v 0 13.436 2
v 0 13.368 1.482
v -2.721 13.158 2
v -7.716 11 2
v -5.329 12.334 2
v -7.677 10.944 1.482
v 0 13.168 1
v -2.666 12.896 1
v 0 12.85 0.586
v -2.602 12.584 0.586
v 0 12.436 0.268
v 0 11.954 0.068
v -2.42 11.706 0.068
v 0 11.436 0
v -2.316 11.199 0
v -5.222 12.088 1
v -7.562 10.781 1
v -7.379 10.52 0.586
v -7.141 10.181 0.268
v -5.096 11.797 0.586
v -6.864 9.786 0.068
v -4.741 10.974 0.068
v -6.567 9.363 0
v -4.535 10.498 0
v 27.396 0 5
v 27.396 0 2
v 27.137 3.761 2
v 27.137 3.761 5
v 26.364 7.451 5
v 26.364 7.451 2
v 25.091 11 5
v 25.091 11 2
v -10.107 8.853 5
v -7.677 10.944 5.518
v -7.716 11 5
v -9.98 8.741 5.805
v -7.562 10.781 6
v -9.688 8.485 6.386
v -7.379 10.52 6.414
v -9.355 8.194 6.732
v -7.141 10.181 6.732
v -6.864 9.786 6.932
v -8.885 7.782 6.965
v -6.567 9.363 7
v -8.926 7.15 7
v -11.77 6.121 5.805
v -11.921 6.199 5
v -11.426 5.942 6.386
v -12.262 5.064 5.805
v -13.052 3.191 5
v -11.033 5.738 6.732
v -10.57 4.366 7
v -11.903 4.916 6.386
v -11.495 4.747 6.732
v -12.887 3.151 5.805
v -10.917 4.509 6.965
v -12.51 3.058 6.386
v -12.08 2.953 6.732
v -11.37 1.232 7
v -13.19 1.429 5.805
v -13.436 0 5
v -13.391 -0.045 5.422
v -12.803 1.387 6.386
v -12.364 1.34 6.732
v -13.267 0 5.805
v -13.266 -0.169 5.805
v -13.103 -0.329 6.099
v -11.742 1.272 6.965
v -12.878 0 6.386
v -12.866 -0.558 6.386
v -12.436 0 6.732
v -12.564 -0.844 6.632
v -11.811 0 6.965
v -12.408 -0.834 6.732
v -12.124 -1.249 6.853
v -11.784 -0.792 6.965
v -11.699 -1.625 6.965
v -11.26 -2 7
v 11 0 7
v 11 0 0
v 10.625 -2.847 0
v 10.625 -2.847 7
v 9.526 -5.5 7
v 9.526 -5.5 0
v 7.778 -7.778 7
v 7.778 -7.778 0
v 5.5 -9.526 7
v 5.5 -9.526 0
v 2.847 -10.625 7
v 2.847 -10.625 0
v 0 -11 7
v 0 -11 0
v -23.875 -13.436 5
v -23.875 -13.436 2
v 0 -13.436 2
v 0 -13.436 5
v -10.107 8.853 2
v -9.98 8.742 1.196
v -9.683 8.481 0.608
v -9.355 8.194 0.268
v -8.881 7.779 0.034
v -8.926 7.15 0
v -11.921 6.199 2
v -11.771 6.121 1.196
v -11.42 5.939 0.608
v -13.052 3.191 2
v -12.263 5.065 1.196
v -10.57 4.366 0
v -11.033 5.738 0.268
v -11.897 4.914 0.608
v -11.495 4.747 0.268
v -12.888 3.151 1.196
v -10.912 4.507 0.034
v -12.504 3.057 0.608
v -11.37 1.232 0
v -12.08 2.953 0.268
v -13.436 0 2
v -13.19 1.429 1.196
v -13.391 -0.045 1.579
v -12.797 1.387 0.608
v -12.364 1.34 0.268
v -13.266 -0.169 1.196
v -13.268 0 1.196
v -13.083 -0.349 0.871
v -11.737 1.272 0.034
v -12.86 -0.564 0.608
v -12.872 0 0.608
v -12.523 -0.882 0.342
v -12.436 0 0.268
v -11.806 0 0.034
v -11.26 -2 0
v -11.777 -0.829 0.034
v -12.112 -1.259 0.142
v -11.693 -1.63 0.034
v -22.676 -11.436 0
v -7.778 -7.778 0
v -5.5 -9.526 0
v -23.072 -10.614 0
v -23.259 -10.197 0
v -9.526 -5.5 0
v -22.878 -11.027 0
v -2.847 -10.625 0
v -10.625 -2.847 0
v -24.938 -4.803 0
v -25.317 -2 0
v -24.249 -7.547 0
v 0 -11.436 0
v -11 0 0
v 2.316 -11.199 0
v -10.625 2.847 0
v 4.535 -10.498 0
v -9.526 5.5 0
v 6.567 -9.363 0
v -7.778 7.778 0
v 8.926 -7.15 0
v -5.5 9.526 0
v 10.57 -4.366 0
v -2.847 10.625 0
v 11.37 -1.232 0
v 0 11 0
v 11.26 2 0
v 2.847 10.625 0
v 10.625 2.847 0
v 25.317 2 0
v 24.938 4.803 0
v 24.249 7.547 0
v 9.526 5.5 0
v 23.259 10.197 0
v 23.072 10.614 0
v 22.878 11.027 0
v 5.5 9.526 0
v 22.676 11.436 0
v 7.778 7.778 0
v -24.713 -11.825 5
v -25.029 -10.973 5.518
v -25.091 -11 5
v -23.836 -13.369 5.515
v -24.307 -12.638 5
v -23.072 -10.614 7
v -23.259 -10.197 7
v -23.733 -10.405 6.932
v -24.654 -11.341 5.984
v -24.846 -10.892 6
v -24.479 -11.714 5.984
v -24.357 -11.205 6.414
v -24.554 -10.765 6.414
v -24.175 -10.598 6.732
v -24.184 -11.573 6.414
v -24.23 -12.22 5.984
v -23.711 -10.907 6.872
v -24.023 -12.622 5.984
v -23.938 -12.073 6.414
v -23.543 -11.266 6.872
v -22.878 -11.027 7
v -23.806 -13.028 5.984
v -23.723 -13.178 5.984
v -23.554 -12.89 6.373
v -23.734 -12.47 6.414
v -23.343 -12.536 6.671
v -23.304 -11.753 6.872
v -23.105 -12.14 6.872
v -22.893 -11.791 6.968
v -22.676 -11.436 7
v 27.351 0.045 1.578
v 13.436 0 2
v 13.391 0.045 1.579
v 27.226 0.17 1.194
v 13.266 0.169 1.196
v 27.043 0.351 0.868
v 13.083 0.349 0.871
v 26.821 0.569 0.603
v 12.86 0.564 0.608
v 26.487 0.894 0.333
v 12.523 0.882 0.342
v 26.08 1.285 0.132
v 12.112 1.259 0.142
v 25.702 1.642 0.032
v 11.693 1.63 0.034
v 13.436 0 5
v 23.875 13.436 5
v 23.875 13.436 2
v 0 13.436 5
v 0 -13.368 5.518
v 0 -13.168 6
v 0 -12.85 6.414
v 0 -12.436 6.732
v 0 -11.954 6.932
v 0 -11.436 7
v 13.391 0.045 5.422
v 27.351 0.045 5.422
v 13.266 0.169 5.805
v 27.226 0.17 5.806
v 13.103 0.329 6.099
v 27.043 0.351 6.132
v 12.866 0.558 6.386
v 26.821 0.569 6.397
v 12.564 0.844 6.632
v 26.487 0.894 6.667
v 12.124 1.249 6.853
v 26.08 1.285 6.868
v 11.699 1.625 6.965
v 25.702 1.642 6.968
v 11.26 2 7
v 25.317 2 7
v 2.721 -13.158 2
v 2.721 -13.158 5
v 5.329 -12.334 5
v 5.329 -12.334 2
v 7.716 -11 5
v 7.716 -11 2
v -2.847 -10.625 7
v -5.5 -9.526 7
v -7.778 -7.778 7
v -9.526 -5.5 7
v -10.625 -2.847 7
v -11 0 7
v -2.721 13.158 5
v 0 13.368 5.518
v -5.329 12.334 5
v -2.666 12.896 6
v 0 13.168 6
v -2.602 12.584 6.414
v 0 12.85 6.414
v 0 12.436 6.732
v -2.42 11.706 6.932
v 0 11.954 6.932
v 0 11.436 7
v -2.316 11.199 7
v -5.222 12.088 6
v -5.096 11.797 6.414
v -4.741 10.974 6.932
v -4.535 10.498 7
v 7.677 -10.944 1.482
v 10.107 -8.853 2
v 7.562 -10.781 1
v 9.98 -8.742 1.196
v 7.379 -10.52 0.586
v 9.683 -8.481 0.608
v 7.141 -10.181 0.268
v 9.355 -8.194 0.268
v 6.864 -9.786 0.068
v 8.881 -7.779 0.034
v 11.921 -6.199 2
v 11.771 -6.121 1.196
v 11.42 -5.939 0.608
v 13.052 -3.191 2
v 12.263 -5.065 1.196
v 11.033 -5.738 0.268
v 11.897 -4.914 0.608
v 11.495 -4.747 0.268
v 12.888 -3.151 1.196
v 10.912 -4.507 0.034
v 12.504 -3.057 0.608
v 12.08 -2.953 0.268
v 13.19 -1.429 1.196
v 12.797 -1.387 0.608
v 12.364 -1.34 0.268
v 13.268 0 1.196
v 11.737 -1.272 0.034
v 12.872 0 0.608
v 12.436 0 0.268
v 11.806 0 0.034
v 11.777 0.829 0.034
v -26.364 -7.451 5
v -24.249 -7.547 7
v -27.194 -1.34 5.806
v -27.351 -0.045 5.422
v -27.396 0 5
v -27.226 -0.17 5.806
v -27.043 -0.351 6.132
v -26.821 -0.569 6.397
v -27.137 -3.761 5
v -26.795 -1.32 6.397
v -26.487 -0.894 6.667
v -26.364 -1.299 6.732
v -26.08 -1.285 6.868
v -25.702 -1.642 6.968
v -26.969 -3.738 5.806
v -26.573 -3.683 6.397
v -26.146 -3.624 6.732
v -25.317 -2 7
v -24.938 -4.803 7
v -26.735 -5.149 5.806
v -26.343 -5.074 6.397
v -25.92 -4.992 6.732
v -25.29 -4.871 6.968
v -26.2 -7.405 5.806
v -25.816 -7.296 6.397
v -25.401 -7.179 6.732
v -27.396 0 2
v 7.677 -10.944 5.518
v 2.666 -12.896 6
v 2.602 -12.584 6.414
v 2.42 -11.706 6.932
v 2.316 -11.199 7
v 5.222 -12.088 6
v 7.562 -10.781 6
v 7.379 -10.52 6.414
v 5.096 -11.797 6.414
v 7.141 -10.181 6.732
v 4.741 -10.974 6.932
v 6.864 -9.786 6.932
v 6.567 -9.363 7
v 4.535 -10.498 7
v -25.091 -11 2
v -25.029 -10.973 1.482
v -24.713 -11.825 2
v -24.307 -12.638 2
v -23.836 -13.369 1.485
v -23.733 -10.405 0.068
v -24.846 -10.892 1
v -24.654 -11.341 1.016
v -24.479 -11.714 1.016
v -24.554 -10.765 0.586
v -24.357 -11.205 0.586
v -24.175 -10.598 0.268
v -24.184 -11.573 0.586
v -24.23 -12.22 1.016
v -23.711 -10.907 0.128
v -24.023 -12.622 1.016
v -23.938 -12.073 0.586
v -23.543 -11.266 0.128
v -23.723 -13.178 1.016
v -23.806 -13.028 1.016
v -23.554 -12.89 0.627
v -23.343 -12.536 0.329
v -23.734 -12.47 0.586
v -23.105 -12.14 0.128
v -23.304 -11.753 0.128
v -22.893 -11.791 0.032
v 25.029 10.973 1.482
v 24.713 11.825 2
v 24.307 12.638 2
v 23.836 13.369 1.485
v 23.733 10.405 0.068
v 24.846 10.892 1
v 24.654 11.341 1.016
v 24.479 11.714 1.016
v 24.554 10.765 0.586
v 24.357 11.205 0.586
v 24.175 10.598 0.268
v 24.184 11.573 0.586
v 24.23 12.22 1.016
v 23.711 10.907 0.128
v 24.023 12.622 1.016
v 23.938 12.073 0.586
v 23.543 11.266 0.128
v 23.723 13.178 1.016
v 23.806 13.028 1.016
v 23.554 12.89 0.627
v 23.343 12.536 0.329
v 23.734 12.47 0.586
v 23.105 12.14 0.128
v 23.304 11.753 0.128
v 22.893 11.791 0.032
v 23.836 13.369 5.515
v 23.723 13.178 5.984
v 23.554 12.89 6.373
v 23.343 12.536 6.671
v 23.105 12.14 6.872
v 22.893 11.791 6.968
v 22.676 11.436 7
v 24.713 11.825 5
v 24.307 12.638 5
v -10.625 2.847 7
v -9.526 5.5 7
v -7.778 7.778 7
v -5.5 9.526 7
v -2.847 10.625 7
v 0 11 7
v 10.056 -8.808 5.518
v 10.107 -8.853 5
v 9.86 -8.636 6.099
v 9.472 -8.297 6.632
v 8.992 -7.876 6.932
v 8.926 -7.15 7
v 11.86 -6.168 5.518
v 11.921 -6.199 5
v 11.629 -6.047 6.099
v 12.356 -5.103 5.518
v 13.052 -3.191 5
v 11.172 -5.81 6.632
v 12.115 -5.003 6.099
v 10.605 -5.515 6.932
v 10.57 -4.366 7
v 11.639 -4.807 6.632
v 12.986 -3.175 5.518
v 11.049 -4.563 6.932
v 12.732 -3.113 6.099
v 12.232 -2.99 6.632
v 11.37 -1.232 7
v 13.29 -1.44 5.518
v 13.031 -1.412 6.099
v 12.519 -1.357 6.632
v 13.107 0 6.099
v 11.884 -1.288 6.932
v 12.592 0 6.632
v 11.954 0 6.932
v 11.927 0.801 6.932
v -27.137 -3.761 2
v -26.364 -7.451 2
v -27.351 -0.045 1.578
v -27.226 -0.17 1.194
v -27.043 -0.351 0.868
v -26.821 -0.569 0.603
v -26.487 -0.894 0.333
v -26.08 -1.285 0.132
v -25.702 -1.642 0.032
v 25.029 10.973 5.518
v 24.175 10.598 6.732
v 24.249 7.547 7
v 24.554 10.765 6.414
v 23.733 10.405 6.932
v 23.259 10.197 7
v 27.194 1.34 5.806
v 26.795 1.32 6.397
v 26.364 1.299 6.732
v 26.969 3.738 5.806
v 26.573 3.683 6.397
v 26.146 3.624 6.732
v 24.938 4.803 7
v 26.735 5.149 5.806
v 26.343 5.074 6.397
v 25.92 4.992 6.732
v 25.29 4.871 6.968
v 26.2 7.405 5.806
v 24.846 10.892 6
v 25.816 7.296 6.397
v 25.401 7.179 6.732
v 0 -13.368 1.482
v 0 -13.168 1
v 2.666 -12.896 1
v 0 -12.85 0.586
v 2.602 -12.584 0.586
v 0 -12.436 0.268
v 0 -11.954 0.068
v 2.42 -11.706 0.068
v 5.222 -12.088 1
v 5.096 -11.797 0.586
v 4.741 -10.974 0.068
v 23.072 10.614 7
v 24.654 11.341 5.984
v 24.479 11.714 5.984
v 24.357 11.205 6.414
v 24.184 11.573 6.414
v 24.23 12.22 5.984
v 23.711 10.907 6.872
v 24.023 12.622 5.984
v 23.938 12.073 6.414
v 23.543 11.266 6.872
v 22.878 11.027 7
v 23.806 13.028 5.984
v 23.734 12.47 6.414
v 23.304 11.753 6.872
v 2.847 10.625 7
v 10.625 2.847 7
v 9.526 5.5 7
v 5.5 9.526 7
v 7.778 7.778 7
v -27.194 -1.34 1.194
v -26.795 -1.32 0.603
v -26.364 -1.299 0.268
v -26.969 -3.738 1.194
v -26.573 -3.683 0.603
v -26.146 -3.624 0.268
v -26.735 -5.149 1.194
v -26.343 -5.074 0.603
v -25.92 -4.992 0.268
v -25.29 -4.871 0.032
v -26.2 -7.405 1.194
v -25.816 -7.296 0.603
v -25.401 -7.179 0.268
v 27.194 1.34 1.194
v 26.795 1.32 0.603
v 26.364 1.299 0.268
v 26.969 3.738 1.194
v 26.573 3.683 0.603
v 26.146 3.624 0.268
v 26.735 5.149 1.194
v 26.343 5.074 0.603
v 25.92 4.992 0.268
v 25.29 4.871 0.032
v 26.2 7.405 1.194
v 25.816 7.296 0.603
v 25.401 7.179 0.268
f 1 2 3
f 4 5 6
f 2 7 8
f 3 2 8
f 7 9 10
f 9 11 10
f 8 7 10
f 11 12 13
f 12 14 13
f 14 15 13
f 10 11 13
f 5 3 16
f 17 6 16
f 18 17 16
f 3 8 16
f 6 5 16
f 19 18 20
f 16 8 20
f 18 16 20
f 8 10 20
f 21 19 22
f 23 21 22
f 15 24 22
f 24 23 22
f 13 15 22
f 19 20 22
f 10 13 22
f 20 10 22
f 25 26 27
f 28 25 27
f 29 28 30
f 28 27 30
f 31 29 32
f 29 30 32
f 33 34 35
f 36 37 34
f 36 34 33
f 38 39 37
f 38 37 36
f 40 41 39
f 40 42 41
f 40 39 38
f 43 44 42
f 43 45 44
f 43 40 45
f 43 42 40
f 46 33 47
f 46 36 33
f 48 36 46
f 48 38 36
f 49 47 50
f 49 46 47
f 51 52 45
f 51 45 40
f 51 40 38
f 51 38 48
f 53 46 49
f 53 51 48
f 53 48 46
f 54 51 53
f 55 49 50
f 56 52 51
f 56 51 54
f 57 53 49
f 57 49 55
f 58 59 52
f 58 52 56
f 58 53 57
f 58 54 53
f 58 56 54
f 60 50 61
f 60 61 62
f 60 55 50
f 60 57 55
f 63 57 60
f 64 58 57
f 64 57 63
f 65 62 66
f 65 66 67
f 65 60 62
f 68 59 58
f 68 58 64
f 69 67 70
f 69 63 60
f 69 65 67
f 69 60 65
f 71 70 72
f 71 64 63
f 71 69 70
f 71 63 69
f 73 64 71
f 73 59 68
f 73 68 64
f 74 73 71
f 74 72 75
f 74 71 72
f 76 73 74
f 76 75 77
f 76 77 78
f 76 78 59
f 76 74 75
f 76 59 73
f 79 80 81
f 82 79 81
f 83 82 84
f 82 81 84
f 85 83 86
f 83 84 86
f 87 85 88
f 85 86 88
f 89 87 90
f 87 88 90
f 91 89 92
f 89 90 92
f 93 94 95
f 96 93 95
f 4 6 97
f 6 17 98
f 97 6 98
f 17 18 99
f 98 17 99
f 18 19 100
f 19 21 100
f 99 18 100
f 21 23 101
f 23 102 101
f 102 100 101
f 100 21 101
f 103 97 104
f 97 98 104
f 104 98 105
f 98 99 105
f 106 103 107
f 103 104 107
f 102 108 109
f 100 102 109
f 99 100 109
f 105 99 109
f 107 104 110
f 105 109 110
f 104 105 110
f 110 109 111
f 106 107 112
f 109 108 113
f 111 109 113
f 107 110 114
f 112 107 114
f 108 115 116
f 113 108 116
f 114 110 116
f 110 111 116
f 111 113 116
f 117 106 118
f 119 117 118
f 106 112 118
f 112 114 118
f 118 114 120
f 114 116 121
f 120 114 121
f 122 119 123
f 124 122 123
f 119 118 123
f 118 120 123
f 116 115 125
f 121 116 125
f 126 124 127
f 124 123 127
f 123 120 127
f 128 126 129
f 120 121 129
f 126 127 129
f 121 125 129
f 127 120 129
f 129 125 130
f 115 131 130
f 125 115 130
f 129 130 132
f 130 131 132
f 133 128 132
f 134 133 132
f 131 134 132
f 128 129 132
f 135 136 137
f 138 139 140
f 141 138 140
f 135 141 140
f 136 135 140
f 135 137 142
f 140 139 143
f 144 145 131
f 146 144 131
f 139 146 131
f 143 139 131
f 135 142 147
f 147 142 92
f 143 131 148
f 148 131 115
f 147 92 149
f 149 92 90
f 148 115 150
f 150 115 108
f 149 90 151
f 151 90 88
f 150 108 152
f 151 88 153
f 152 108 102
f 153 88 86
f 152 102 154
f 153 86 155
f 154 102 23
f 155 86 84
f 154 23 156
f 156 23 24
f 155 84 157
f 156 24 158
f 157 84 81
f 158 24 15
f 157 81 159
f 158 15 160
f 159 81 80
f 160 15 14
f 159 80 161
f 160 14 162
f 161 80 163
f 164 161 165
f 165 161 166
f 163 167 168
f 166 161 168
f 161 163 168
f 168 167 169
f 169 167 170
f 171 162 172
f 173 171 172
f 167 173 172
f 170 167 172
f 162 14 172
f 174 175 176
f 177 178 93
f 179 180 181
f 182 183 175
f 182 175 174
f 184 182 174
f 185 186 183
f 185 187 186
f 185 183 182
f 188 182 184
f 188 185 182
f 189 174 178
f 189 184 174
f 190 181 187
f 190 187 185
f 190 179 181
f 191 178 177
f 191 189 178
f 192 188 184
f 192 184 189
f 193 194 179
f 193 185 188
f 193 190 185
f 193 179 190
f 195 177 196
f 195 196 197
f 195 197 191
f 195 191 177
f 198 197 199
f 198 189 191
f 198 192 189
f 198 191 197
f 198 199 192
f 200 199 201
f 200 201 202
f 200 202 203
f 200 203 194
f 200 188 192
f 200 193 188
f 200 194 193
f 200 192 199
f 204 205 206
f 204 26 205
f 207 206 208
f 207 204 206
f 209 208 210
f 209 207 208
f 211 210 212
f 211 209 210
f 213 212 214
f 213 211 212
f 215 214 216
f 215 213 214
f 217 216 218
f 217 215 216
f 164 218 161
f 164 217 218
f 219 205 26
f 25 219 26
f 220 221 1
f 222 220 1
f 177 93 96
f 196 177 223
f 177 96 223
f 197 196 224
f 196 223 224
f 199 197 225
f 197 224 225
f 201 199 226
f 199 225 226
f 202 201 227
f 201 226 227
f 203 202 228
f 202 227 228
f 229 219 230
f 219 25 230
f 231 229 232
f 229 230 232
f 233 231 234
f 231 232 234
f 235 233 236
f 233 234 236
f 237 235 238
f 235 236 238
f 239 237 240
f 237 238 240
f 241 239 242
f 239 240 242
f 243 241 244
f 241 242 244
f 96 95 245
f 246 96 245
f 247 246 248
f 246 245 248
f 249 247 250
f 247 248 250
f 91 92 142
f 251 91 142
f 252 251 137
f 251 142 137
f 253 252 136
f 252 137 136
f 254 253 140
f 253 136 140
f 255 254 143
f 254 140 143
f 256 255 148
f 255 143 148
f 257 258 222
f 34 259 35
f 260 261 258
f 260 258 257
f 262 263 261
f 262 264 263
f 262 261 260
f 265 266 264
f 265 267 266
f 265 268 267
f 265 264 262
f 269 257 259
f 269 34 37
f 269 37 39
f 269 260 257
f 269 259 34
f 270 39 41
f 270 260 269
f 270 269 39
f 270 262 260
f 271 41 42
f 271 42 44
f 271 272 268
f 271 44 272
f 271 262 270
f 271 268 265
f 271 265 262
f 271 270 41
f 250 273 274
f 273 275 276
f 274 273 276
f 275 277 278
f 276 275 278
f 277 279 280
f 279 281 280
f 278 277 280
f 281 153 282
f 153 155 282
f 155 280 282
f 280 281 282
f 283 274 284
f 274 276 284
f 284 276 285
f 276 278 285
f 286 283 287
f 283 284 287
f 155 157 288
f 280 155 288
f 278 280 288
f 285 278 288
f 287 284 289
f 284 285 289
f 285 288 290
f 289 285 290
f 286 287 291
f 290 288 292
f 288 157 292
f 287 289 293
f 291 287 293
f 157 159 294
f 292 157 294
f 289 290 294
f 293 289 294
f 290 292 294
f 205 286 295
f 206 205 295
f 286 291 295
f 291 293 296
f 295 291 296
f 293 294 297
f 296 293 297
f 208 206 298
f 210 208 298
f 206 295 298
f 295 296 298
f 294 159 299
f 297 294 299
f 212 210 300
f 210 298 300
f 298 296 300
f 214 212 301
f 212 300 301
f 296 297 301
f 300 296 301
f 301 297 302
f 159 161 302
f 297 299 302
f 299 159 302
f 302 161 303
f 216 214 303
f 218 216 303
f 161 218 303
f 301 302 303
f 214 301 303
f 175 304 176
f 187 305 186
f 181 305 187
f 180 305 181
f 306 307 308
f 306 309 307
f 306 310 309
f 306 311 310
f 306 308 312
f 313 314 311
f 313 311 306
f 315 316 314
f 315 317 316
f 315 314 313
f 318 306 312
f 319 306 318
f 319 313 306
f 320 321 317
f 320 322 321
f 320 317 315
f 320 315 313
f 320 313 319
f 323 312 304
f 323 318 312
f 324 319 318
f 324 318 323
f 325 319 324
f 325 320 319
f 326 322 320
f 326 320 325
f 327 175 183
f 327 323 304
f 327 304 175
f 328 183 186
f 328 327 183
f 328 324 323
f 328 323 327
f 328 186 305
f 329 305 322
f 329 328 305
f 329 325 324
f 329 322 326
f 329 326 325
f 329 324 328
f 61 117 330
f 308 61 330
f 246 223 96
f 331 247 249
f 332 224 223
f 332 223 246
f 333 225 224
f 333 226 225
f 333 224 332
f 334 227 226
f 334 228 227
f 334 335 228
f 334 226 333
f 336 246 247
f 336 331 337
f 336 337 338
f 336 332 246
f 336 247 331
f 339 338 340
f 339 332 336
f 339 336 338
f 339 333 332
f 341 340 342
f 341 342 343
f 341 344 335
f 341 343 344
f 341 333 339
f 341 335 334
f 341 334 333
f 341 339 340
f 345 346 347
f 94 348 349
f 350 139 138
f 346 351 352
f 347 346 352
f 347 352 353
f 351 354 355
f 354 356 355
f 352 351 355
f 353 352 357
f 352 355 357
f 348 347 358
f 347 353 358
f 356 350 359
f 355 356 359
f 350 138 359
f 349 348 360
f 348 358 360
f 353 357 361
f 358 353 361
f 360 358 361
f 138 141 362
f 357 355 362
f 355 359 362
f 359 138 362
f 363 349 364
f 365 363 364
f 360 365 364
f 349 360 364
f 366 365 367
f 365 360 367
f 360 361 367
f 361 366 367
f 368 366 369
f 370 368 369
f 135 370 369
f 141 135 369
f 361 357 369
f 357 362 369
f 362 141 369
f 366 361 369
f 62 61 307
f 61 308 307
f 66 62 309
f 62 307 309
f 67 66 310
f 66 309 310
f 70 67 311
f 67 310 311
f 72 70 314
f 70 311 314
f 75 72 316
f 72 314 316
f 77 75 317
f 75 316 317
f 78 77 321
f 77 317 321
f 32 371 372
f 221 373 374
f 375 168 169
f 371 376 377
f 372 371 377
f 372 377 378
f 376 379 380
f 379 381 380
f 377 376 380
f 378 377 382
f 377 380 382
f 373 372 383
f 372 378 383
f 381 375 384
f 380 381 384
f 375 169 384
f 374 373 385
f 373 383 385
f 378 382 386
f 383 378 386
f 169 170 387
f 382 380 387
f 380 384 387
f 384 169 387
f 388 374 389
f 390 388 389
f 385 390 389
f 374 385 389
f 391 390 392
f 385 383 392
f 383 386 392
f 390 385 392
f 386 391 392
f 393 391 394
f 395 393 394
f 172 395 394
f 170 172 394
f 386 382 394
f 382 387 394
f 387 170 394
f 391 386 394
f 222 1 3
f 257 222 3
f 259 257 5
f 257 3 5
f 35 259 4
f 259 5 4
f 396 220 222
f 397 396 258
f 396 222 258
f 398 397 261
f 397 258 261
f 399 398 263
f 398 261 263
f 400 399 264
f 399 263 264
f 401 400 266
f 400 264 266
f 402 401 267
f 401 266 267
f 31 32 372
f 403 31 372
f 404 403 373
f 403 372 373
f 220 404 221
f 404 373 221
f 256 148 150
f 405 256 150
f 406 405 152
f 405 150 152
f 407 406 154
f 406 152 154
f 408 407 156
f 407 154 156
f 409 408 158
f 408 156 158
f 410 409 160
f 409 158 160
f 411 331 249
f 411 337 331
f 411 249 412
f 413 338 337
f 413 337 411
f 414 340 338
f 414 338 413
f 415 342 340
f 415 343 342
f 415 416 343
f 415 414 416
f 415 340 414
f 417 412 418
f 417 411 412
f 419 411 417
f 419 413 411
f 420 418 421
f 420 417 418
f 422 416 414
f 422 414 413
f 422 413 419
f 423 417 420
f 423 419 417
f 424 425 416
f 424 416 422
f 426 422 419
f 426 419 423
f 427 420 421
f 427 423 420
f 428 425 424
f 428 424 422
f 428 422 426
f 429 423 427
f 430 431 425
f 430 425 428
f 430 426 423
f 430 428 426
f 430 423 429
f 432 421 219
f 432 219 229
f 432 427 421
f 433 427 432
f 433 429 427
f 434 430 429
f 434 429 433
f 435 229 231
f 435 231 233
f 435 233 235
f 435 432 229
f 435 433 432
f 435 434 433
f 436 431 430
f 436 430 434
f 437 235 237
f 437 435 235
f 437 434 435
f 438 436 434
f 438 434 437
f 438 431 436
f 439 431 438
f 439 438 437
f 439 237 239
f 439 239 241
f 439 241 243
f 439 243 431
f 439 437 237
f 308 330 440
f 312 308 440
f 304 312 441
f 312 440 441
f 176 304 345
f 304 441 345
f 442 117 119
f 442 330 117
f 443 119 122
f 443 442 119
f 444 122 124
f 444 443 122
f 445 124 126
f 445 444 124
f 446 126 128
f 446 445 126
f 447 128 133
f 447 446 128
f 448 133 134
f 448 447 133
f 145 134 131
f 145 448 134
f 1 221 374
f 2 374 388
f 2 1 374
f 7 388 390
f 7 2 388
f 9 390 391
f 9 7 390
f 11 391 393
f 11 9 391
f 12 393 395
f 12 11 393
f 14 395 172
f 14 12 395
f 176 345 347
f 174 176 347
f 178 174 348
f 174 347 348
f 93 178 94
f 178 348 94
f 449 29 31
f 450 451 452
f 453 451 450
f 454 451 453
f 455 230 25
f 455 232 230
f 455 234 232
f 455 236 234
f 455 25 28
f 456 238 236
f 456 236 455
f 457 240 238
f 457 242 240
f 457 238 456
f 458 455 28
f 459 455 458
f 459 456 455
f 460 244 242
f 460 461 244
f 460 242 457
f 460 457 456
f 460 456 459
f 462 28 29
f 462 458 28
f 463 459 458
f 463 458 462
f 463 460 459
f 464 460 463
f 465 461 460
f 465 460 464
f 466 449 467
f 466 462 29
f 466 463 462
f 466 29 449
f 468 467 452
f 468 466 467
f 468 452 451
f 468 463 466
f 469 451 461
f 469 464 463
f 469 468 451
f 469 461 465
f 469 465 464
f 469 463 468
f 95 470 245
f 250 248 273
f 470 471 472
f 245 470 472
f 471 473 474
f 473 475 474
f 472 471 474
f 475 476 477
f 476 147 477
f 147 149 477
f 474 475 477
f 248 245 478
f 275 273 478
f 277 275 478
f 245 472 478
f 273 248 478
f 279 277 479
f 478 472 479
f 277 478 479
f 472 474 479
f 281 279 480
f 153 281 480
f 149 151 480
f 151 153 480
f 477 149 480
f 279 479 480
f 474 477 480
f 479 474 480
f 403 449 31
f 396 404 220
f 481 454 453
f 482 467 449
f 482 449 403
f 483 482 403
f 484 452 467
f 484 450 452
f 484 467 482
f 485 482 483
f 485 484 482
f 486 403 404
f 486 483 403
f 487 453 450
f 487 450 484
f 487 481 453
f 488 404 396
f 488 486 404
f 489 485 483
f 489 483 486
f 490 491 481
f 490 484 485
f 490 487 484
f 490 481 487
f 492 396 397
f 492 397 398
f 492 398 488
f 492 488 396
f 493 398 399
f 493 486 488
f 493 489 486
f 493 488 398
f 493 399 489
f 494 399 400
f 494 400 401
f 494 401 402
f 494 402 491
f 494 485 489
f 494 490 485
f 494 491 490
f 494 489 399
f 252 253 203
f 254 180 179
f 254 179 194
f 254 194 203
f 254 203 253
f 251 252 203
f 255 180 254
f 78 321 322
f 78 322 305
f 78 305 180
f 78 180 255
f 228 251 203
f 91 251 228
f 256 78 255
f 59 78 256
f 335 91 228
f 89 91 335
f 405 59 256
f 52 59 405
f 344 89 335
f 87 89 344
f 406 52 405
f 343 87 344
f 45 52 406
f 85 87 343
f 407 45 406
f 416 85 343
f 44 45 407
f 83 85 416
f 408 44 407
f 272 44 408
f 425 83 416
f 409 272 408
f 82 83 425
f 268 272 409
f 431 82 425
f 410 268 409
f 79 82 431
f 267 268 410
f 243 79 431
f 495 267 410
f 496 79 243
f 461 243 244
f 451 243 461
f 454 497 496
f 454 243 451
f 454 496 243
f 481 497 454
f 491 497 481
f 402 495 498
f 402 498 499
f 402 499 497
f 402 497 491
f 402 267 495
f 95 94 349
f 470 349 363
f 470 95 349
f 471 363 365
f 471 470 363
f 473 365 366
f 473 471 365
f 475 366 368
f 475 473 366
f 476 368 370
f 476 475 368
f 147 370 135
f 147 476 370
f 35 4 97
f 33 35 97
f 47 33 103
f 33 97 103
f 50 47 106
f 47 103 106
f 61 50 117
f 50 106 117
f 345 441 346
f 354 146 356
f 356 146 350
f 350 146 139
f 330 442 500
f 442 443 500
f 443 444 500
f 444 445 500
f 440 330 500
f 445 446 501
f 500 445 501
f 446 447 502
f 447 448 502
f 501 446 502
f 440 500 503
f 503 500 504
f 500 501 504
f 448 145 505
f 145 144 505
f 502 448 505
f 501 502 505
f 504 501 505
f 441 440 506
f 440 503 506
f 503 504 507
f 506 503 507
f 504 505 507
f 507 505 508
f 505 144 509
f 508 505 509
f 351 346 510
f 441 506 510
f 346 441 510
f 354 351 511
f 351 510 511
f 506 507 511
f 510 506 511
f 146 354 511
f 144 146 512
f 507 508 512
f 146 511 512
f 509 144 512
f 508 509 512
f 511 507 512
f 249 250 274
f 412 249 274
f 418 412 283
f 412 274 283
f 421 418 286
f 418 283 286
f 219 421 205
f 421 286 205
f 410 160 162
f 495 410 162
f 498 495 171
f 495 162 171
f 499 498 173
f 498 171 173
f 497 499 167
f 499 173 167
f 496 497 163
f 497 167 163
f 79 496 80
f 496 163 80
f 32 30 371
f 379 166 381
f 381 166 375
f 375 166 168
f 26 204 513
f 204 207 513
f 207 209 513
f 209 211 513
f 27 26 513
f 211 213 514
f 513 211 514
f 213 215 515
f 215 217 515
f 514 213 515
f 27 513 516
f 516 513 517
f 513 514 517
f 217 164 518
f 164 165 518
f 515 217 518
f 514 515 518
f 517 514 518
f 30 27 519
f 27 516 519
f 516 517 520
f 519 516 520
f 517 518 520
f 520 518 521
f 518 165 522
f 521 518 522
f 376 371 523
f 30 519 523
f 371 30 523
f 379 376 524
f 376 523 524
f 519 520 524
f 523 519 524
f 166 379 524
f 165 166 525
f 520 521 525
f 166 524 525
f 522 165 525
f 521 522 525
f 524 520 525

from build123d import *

# Parameters (mm, degrees)
F1_DEPTH = 7
F2_R     = 2


with BuildPart() as f1:
    # F0 (on Top) → F1 (new body)
    with BuildSketch(Plane.XY):
        with BuildLine():
            ThreePointArc((-11, 0), (-7.7781745931, 7.7781745931), (0, 11))
            Line((0, 11), (-7.7157273072, 11))
            ThreePointArc((-7.7157273072, 11), (-11.9206288377, 6.1992786672), (-13.4362363733, 0))
            Line((-13.4362363733, 0), (-11, 0))
        make_face()
        with BuildLine():
            ThreePointArc((0, 11), (7.7781745931, 7.7781745931), (11, 0))
            Line((11, 0), (13.4362363733, 0))
            ThreePointArc((13.4362363733, 0), (11.9206288377, 6.1992786672), (7.7157273072, 11))
            Line((7.7157273072, 11), (0, 11))
        make_face()
        with BuildLine():
            Line((13.4362363733, 0), (11, 0))
            ThreePointArc((11, 0), (7.7781745931, -7.7781745931), (0, -11))
            Line((0, -11), (7.7157273072, -11))
            ThreePointArc((7.7157273072, -11), (11.9206288377, -6.1992786672), (13.4362363733, 0))
        make_face()
        with BuildLine():
            Line((7.7157273072, -11), (0, -11))
            Line((0, -11), (0, -13.4362363733))
            ThreePointArc((0, -13.4362363733), (4.0456055031, -12.8127094712), (7.7157273072, -11))
        make_face()
        with BuildLine():
            Line((0, -13.4362363733), (0, -11))
            Line((0, -11), (-7.7157273072, -11))
            ThreePointArc((-7.7157273072, -11), (-4.0456055031, -12.8127094712), (0, -13.4362363733))
        make_face()
        with BuildLine():
            Line((-7.7157273072, -11), (0, -11))
            ThreePointArc((0, -11), (-7.7781745931, -7.7781745931), (-11, 0))
            Line((-11, 0), (-13.4362363733, 0))
            ThreePointArc((-13.4362363733, 0), (-11.9206288377, -6.1992786672), (-7.7157273072, -11))
        make_face()
        with BuildLine():
            Line((-25.0909402017, -11), (-7.7157273072, -11))
            ThreePointArc((-7.7157273072, -11), (-11.9206288377, -6.1992786672), (-13.4362363733, 0))
            Line((-13.4362363733, 0), (-27.3962639826, 0))
            ThreePointArc((-27.3962639826, 0), (-26.8137399624, -5.619486581), (-25.0909402017, -11))
        make_face()
        with BuildLine():
            ThreePointArc((7.7157273072, 11), (11.9206288377, 6.1992786672), (13.4362363733, 0))
            Line((13.4362363733, 0), (27.3962639826, 0))
            ThreePointArc((27.3962639826, 0), (26.8137399624, 5.619486581), (25.0909402017, 11))
            Line((25.0909402017, 11), (7.7157273072, 11))
        make_face()
        with BuildLine():
            Line((0, 13.4362363733), (0, 11))
            Line((0, 11), (7.7157273072, 11))
            ThreePointArc((7.7157273072, 11), (4.0456055031, 12.8127094712), (0, 13.4362363733))
        make_face()
        with BuildLine():
            Line((-7.7157273072, 11), (0, 11))
            Line((0, 11), (0, 13.4362363733))
            ThreePointArc((0, 13.4362363733), (-4.0456055031, 12.8127094712), (-7.7157273072, 11))
        make_face()
        with BuildLine():
            Line((-23.8751509383, -13.4362363733), (0, -13.4362363733))
            ThreePointArc((0, -13.4362363733), (-4.0456055031, -12.8127094712), (-7.7157273072, -11))
            Line((-7.7157273072, -11), (-25.0909402017, -11))
            ThreePointArc((-25.0909402017, -11), (-24.5133296861, -12.2332312946), (-23.8751509383, -13.4362363733))
        make_face()
        with BuildLine():
            Line((23.8751509383, 13.4362363733), (0, 13.4362363733))
            ThreePointArc((0, 13.4362363733), (4.0456055031, 12.8127094712), (7.7157273072, 11))
            Line((7.7157273072, 11), (25.0909402017, 11))
            ThreePointArc((25.0909402017, 11), (24.5133296861, 12.2332312946), (23.8751509383, 13.4362363733))
        make_face()
    extrude(amount=F1_DEPTH)

    # F2
    f2_edges = [f1.edges().sort_by_distance(p)[0] for p in [
        (-9.500854, 9.500854, 7),
        (9.500854, -9.500854, 7),
        (-11.937575, -13.436236, 0),
        (-26.50137, -6.944975, 0),
        (11.937575, 13.436236, 0),
        (26.50137, 6.944975, 0),
        (20.41625, 0, 0),
        (-20.41625, 0, 0),
        (26.50137, 6.944975, 7),
        (-26.50137, -6.944975, 7),
        (20.41625, 0, 7),
        (-20.41625, 0, 7),
        (11.937575, 13.436236, 7),
    ]]
    fillet(f2_edges, radius=F2_R)


solid = f1.part
